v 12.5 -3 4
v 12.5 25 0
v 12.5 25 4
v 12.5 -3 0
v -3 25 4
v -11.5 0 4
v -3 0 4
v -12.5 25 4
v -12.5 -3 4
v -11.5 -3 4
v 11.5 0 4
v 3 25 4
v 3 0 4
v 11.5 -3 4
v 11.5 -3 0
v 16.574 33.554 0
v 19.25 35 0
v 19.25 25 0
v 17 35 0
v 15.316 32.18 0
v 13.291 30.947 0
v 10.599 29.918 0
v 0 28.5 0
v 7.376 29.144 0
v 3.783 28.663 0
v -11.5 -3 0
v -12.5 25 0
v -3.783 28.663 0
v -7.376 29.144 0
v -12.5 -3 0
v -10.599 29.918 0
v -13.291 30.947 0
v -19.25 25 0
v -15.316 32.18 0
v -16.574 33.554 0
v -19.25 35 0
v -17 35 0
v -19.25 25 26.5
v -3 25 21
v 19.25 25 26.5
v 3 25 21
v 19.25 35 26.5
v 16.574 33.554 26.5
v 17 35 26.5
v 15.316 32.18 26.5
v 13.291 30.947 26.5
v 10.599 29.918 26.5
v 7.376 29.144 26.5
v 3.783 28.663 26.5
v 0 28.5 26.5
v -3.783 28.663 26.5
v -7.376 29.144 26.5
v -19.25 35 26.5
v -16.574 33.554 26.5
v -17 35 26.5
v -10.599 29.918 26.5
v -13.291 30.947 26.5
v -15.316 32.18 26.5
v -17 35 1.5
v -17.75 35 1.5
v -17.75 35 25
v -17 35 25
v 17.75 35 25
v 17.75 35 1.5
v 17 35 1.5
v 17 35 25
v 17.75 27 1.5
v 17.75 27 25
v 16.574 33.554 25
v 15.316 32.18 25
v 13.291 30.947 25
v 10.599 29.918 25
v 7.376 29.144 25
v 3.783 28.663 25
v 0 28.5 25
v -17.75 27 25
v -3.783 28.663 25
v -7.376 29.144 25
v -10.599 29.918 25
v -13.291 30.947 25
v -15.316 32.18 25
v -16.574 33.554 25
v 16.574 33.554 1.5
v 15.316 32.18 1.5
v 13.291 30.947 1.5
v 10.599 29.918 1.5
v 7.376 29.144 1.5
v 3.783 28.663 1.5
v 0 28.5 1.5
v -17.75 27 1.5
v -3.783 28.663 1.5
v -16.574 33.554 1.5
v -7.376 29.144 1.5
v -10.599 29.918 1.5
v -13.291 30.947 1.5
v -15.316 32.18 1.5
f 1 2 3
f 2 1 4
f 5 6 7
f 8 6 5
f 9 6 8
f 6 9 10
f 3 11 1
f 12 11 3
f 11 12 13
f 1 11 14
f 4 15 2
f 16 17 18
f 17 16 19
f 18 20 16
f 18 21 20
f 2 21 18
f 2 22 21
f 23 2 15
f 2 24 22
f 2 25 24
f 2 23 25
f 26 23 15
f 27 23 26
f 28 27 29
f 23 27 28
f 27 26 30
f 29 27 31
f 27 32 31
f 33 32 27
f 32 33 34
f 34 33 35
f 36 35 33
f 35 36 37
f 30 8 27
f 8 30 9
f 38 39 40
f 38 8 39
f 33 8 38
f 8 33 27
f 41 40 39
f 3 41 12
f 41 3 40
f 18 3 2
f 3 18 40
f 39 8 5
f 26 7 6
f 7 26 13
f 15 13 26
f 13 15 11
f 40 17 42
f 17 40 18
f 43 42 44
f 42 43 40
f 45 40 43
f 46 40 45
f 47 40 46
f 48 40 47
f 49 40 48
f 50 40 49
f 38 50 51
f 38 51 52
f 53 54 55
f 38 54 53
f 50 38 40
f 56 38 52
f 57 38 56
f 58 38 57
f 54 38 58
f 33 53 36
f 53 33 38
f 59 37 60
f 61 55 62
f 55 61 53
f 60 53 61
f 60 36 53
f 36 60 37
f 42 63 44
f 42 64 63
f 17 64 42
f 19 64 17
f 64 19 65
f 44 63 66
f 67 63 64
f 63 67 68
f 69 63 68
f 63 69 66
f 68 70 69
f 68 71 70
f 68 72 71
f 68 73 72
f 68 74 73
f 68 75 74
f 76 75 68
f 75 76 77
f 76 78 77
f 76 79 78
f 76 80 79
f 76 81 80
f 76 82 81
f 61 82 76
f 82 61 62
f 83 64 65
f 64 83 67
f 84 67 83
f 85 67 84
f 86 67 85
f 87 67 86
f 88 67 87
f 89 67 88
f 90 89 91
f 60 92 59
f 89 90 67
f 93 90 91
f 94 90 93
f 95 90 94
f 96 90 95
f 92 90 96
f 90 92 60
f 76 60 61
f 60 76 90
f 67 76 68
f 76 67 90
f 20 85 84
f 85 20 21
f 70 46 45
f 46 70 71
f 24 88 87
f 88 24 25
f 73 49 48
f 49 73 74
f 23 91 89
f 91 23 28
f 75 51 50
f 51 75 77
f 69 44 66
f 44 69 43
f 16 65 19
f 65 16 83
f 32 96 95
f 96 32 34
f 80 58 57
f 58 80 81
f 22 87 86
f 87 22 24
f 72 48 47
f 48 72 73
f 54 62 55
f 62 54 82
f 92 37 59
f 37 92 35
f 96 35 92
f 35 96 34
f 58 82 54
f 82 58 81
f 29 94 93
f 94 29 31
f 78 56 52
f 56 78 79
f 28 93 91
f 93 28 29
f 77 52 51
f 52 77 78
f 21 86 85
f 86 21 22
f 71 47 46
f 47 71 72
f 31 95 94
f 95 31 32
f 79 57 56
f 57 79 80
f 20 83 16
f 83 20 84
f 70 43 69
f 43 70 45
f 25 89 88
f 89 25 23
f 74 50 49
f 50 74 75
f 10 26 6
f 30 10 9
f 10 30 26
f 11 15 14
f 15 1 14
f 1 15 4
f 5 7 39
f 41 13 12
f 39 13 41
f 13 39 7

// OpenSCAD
// preview[view:north west, tilt:top diagonal]

//the width of the new stone
stone_w = 35;//[10:60]

//height of the new stone
stone_h = 23;//[5:60]

//new stone length
stone_l = 98;//[40:148]

//original (old) stone length
original_stone_l = 158;//[120:170]

//Cutout
cut = 1; //[1:On,2:Off]


dist = (original_stone_l - stone_l)/2 - 3 - 2;

translate ([-25 / 2, 0, 0]) {cube ([25, dist, 4], 0);

rotate ([0, 270, 180]){ 
    linear_extrude(height = 25, center = 0, convexity = 10, twist = 0) polygon(points=[[0,0],[4,0],[0,3]],center = 0);
    }
}

translate ([-25/2, -3, 0]) cube ([1, 3, 4],0);
translate ([-25/2+24, -3, 0]) cube ([1, 3, 4],0);

difference (){
    
    translate ([- ((stone_w + 3.5) / 2), dist, 0]) {
        cube ([stone_w + 3.5, 10, stone_h + 3.5],0);
    }
    
    translate ([- (stone_w + 0.5 ) / 2, dist + 2, 1.5]) {
        cube ([stone_w + 0.5, 10, stone_h + 0.5 ],0);
    }
    
    if (cut == 1){
        translate ([0, dist + 10, -1]) resize([stone_w - 1, 13, 0]) {
            cylinder(stone_h + 5, d = stone_w / 2 );
        }
    }
}

rotate ([0, 270, 180]) translate([4, - dist, - 3]){ 
    linear_extrude(height = 6, center = 0, convexity = 10, twist = 0) polygon(points=[[0,0],[stone_h - 6, 0],[0, dist]], center=0);
}
